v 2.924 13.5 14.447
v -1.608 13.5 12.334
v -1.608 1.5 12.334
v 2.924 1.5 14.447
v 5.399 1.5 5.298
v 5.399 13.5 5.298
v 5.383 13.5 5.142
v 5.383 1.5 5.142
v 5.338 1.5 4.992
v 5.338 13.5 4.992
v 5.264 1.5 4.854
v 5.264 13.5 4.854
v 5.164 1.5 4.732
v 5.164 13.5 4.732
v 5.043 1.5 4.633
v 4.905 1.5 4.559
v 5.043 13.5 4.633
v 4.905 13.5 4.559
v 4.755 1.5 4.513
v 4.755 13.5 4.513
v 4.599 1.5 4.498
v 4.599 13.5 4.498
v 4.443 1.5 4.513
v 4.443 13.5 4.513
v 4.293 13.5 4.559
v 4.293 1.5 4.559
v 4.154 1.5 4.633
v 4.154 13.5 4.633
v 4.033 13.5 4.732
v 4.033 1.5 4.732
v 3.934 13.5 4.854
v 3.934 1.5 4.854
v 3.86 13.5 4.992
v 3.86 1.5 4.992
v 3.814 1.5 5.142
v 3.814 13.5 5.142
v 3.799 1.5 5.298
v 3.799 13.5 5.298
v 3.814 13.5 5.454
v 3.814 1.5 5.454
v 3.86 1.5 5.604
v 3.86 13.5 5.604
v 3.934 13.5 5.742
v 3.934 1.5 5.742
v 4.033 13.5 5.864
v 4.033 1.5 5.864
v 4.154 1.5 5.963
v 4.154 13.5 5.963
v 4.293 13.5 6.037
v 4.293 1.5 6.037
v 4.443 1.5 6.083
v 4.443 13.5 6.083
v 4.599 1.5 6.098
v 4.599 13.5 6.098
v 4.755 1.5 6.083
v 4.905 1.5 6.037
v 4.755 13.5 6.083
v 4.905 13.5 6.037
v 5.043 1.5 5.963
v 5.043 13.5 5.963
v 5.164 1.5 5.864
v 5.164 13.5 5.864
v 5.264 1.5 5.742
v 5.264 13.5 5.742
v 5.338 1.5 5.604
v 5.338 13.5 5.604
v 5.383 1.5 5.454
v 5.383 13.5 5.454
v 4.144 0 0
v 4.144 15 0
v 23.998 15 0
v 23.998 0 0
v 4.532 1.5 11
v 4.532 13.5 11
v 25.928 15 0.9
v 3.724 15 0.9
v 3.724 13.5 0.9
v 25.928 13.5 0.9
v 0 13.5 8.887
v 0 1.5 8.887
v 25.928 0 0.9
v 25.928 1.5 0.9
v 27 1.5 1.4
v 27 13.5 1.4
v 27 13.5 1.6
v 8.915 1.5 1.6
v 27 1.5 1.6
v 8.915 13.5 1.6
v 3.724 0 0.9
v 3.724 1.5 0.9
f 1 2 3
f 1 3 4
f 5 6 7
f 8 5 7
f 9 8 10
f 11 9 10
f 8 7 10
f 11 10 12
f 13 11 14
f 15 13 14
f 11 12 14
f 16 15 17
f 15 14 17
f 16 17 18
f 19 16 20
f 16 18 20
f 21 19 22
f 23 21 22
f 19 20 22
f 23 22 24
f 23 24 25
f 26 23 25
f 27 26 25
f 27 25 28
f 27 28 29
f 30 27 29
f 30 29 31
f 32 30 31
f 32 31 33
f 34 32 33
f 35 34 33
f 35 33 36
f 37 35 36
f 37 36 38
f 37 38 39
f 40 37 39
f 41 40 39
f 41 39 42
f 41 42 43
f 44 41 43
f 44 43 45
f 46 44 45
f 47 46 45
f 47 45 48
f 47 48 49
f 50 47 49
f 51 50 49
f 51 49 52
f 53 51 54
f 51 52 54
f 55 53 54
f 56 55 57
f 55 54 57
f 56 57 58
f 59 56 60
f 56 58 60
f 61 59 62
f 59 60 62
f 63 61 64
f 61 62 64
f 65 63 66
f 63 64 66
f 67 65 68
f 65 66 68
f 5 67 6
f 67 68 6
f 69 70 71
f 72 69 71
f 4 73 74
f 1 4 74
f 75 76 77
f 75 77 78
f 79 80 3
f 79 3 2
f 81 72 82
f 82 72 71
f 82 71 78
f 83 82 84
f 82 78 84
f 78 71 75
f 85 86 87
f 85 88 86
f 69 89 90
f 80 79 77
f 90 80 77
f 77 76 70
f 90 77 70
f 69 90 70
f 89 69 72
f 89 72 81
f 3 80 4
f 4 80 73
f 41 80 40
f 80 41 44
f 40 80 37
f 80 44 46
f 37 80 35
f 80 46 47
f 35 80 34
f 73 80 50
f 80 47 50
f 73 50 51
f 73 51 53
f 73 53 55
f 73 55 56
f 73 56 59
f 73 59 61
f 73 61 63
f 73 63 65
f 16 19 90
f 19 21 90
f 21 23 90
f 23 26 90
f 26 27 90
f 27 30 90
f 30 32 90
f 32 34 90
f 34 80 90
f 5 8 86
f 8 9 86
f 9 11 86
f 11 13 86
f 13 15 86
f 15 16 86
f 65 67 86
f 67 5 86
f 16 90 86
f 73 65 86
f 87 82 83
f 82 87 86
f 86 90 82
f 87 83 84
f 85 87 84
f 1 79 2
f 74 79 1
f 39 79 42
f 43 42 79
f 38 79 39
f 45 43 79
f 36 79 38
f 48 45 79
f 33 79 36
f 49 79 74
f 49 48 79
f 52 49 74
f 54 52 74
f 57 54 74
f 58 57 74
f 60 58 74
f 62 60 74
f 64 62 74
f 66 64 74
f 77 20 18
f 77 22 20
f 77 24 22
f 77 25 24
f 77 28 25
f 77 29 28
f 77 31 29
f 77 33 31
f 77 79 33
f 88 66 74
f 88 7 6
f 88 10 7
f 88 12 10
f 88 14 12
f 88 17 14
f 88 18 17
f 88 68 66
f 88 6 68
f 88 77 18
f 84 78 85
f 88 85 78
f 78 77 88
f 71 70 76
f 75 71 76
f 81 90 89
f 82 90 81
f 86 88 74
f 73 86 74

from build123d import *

# Parameters (mm, degrees)
SKETCH_1_W               = 27
SKETCH_1_H               = 15
EXTRUDE_1_DEPTH          = 11
CUT_EXTRUDE_6_DEPTH      = 16
SKETCH_2_OUTSIDE_W       = 35.558
SKETCH_2_OUTSIDE_H       = 23.558
SKETCH_2_OUTSIDE_W_2     = 28.581712044
SKETCH_2_OUTSIDE_H_2     = 12
CUT_EXTRUDE_1_DEPTH      = 10.4
CUT_EXTRUDE_1_DEPTH_BACK = 0.7
SKETCH_6_W               = 5
SKETCH_6_H               = 12
EXTRUDE_2_DEPTH          = 3.803863
SKETCH_7_R               = 0.8
CUT_EXTRUDE_7_DEPTH      = 14.5


with BuildPart() as part:
    # Эскиз1 → Бобышка-Вытянуть1 (new body)
    with BuildSketch(Plane.XY):
        with Locations((13.5, 7.5)):
            Rectangle(SKETCH_1_W, SKETCH_1_H)
    extrude(amount=EXTRUDE_1_DEPTH)

    # Эскиз5 → Вырез-Вытянуть6 (cut, through all)
    with BuildSketch(Plane(origin=(0, 15, 0), x_dir=(1, 0, 0), z_dir=(0, 1, 0))):
        Polygon((0, 0), (0, -8.886908691), (4.14403358, 0), align=None)
        Polygon((27, -11), (27, -1.6), (8.914830922, -1.6), (4.531538935, -11), align=None)
        Polygon((0, -11), (4.531538935, -11), (0, -8.886908691), align=None)
        Polygon((23.997690311, 0), (27, -1.4), (27, 0), align=None)
    extrude(amount=-CUT_EXTRUDE_6_DEPTH, mode=Mode.SUBTRACT)

    # Эскиз2 outside → Вырез-Вытянуть1 (cut, two sides)
    with BuildSketch(Plane.XY.offset(1.6)) as cut_extrude_1_sk:
        with Locations((13.5, 7.5)):
            Rectangle(SKETCH_2_OUTSIDE_W, SKETCH_2_OUTSIDE_H)
        with Locations((13.459567245, 7.5)):
            Rectangle(SKETCH_2_OUTSIDE_W_2, SKETCH_2_OUTSIDE_H_2, mode=Mode.SUBTRACT)
    extrude(amount=CUT_EXTRUDE_1_DEPTH, mode=Mode.SUBTRACT)
    extrude(cut_extrude_1_sk.sketch, amount=-CUT_EXTRUDE_1_DEPTH_BACK, mode=Mode.SUBTRACT)

    # Эскиз6 → Бобышка-Вытянуть2 (add)
    with BuildSketch(Plane(origin=(-3.40388351, 0, 7.299651743), x_dir=(0.906307787, 0, 0.422618262), z_dir=(-0.422618262, 0, 0.906307787))):
        with Locations((6.255769903, 7.5)):
            Rectangle(SKETCH_6_W, SKETCH_6_H)
    extrude(amount=EXTRUDE_2_DEPTH)

    # Эскиз7 → Вырез-Вытянуть7 (cut, through all)
    with BuildSketch(Plane(origin=(0, 13.5, 0), x_dir=(1, 0, 0), z_dir=(0, 1, 0))):
        with Locations((4.598685766, -5.298008566)):
            Circle(SKETCH_7_R)
    extrude(amount=-CUT_EXTRUDE_7_DEPTH, mode=Mode.SUBTRACT)


solid = part.part
